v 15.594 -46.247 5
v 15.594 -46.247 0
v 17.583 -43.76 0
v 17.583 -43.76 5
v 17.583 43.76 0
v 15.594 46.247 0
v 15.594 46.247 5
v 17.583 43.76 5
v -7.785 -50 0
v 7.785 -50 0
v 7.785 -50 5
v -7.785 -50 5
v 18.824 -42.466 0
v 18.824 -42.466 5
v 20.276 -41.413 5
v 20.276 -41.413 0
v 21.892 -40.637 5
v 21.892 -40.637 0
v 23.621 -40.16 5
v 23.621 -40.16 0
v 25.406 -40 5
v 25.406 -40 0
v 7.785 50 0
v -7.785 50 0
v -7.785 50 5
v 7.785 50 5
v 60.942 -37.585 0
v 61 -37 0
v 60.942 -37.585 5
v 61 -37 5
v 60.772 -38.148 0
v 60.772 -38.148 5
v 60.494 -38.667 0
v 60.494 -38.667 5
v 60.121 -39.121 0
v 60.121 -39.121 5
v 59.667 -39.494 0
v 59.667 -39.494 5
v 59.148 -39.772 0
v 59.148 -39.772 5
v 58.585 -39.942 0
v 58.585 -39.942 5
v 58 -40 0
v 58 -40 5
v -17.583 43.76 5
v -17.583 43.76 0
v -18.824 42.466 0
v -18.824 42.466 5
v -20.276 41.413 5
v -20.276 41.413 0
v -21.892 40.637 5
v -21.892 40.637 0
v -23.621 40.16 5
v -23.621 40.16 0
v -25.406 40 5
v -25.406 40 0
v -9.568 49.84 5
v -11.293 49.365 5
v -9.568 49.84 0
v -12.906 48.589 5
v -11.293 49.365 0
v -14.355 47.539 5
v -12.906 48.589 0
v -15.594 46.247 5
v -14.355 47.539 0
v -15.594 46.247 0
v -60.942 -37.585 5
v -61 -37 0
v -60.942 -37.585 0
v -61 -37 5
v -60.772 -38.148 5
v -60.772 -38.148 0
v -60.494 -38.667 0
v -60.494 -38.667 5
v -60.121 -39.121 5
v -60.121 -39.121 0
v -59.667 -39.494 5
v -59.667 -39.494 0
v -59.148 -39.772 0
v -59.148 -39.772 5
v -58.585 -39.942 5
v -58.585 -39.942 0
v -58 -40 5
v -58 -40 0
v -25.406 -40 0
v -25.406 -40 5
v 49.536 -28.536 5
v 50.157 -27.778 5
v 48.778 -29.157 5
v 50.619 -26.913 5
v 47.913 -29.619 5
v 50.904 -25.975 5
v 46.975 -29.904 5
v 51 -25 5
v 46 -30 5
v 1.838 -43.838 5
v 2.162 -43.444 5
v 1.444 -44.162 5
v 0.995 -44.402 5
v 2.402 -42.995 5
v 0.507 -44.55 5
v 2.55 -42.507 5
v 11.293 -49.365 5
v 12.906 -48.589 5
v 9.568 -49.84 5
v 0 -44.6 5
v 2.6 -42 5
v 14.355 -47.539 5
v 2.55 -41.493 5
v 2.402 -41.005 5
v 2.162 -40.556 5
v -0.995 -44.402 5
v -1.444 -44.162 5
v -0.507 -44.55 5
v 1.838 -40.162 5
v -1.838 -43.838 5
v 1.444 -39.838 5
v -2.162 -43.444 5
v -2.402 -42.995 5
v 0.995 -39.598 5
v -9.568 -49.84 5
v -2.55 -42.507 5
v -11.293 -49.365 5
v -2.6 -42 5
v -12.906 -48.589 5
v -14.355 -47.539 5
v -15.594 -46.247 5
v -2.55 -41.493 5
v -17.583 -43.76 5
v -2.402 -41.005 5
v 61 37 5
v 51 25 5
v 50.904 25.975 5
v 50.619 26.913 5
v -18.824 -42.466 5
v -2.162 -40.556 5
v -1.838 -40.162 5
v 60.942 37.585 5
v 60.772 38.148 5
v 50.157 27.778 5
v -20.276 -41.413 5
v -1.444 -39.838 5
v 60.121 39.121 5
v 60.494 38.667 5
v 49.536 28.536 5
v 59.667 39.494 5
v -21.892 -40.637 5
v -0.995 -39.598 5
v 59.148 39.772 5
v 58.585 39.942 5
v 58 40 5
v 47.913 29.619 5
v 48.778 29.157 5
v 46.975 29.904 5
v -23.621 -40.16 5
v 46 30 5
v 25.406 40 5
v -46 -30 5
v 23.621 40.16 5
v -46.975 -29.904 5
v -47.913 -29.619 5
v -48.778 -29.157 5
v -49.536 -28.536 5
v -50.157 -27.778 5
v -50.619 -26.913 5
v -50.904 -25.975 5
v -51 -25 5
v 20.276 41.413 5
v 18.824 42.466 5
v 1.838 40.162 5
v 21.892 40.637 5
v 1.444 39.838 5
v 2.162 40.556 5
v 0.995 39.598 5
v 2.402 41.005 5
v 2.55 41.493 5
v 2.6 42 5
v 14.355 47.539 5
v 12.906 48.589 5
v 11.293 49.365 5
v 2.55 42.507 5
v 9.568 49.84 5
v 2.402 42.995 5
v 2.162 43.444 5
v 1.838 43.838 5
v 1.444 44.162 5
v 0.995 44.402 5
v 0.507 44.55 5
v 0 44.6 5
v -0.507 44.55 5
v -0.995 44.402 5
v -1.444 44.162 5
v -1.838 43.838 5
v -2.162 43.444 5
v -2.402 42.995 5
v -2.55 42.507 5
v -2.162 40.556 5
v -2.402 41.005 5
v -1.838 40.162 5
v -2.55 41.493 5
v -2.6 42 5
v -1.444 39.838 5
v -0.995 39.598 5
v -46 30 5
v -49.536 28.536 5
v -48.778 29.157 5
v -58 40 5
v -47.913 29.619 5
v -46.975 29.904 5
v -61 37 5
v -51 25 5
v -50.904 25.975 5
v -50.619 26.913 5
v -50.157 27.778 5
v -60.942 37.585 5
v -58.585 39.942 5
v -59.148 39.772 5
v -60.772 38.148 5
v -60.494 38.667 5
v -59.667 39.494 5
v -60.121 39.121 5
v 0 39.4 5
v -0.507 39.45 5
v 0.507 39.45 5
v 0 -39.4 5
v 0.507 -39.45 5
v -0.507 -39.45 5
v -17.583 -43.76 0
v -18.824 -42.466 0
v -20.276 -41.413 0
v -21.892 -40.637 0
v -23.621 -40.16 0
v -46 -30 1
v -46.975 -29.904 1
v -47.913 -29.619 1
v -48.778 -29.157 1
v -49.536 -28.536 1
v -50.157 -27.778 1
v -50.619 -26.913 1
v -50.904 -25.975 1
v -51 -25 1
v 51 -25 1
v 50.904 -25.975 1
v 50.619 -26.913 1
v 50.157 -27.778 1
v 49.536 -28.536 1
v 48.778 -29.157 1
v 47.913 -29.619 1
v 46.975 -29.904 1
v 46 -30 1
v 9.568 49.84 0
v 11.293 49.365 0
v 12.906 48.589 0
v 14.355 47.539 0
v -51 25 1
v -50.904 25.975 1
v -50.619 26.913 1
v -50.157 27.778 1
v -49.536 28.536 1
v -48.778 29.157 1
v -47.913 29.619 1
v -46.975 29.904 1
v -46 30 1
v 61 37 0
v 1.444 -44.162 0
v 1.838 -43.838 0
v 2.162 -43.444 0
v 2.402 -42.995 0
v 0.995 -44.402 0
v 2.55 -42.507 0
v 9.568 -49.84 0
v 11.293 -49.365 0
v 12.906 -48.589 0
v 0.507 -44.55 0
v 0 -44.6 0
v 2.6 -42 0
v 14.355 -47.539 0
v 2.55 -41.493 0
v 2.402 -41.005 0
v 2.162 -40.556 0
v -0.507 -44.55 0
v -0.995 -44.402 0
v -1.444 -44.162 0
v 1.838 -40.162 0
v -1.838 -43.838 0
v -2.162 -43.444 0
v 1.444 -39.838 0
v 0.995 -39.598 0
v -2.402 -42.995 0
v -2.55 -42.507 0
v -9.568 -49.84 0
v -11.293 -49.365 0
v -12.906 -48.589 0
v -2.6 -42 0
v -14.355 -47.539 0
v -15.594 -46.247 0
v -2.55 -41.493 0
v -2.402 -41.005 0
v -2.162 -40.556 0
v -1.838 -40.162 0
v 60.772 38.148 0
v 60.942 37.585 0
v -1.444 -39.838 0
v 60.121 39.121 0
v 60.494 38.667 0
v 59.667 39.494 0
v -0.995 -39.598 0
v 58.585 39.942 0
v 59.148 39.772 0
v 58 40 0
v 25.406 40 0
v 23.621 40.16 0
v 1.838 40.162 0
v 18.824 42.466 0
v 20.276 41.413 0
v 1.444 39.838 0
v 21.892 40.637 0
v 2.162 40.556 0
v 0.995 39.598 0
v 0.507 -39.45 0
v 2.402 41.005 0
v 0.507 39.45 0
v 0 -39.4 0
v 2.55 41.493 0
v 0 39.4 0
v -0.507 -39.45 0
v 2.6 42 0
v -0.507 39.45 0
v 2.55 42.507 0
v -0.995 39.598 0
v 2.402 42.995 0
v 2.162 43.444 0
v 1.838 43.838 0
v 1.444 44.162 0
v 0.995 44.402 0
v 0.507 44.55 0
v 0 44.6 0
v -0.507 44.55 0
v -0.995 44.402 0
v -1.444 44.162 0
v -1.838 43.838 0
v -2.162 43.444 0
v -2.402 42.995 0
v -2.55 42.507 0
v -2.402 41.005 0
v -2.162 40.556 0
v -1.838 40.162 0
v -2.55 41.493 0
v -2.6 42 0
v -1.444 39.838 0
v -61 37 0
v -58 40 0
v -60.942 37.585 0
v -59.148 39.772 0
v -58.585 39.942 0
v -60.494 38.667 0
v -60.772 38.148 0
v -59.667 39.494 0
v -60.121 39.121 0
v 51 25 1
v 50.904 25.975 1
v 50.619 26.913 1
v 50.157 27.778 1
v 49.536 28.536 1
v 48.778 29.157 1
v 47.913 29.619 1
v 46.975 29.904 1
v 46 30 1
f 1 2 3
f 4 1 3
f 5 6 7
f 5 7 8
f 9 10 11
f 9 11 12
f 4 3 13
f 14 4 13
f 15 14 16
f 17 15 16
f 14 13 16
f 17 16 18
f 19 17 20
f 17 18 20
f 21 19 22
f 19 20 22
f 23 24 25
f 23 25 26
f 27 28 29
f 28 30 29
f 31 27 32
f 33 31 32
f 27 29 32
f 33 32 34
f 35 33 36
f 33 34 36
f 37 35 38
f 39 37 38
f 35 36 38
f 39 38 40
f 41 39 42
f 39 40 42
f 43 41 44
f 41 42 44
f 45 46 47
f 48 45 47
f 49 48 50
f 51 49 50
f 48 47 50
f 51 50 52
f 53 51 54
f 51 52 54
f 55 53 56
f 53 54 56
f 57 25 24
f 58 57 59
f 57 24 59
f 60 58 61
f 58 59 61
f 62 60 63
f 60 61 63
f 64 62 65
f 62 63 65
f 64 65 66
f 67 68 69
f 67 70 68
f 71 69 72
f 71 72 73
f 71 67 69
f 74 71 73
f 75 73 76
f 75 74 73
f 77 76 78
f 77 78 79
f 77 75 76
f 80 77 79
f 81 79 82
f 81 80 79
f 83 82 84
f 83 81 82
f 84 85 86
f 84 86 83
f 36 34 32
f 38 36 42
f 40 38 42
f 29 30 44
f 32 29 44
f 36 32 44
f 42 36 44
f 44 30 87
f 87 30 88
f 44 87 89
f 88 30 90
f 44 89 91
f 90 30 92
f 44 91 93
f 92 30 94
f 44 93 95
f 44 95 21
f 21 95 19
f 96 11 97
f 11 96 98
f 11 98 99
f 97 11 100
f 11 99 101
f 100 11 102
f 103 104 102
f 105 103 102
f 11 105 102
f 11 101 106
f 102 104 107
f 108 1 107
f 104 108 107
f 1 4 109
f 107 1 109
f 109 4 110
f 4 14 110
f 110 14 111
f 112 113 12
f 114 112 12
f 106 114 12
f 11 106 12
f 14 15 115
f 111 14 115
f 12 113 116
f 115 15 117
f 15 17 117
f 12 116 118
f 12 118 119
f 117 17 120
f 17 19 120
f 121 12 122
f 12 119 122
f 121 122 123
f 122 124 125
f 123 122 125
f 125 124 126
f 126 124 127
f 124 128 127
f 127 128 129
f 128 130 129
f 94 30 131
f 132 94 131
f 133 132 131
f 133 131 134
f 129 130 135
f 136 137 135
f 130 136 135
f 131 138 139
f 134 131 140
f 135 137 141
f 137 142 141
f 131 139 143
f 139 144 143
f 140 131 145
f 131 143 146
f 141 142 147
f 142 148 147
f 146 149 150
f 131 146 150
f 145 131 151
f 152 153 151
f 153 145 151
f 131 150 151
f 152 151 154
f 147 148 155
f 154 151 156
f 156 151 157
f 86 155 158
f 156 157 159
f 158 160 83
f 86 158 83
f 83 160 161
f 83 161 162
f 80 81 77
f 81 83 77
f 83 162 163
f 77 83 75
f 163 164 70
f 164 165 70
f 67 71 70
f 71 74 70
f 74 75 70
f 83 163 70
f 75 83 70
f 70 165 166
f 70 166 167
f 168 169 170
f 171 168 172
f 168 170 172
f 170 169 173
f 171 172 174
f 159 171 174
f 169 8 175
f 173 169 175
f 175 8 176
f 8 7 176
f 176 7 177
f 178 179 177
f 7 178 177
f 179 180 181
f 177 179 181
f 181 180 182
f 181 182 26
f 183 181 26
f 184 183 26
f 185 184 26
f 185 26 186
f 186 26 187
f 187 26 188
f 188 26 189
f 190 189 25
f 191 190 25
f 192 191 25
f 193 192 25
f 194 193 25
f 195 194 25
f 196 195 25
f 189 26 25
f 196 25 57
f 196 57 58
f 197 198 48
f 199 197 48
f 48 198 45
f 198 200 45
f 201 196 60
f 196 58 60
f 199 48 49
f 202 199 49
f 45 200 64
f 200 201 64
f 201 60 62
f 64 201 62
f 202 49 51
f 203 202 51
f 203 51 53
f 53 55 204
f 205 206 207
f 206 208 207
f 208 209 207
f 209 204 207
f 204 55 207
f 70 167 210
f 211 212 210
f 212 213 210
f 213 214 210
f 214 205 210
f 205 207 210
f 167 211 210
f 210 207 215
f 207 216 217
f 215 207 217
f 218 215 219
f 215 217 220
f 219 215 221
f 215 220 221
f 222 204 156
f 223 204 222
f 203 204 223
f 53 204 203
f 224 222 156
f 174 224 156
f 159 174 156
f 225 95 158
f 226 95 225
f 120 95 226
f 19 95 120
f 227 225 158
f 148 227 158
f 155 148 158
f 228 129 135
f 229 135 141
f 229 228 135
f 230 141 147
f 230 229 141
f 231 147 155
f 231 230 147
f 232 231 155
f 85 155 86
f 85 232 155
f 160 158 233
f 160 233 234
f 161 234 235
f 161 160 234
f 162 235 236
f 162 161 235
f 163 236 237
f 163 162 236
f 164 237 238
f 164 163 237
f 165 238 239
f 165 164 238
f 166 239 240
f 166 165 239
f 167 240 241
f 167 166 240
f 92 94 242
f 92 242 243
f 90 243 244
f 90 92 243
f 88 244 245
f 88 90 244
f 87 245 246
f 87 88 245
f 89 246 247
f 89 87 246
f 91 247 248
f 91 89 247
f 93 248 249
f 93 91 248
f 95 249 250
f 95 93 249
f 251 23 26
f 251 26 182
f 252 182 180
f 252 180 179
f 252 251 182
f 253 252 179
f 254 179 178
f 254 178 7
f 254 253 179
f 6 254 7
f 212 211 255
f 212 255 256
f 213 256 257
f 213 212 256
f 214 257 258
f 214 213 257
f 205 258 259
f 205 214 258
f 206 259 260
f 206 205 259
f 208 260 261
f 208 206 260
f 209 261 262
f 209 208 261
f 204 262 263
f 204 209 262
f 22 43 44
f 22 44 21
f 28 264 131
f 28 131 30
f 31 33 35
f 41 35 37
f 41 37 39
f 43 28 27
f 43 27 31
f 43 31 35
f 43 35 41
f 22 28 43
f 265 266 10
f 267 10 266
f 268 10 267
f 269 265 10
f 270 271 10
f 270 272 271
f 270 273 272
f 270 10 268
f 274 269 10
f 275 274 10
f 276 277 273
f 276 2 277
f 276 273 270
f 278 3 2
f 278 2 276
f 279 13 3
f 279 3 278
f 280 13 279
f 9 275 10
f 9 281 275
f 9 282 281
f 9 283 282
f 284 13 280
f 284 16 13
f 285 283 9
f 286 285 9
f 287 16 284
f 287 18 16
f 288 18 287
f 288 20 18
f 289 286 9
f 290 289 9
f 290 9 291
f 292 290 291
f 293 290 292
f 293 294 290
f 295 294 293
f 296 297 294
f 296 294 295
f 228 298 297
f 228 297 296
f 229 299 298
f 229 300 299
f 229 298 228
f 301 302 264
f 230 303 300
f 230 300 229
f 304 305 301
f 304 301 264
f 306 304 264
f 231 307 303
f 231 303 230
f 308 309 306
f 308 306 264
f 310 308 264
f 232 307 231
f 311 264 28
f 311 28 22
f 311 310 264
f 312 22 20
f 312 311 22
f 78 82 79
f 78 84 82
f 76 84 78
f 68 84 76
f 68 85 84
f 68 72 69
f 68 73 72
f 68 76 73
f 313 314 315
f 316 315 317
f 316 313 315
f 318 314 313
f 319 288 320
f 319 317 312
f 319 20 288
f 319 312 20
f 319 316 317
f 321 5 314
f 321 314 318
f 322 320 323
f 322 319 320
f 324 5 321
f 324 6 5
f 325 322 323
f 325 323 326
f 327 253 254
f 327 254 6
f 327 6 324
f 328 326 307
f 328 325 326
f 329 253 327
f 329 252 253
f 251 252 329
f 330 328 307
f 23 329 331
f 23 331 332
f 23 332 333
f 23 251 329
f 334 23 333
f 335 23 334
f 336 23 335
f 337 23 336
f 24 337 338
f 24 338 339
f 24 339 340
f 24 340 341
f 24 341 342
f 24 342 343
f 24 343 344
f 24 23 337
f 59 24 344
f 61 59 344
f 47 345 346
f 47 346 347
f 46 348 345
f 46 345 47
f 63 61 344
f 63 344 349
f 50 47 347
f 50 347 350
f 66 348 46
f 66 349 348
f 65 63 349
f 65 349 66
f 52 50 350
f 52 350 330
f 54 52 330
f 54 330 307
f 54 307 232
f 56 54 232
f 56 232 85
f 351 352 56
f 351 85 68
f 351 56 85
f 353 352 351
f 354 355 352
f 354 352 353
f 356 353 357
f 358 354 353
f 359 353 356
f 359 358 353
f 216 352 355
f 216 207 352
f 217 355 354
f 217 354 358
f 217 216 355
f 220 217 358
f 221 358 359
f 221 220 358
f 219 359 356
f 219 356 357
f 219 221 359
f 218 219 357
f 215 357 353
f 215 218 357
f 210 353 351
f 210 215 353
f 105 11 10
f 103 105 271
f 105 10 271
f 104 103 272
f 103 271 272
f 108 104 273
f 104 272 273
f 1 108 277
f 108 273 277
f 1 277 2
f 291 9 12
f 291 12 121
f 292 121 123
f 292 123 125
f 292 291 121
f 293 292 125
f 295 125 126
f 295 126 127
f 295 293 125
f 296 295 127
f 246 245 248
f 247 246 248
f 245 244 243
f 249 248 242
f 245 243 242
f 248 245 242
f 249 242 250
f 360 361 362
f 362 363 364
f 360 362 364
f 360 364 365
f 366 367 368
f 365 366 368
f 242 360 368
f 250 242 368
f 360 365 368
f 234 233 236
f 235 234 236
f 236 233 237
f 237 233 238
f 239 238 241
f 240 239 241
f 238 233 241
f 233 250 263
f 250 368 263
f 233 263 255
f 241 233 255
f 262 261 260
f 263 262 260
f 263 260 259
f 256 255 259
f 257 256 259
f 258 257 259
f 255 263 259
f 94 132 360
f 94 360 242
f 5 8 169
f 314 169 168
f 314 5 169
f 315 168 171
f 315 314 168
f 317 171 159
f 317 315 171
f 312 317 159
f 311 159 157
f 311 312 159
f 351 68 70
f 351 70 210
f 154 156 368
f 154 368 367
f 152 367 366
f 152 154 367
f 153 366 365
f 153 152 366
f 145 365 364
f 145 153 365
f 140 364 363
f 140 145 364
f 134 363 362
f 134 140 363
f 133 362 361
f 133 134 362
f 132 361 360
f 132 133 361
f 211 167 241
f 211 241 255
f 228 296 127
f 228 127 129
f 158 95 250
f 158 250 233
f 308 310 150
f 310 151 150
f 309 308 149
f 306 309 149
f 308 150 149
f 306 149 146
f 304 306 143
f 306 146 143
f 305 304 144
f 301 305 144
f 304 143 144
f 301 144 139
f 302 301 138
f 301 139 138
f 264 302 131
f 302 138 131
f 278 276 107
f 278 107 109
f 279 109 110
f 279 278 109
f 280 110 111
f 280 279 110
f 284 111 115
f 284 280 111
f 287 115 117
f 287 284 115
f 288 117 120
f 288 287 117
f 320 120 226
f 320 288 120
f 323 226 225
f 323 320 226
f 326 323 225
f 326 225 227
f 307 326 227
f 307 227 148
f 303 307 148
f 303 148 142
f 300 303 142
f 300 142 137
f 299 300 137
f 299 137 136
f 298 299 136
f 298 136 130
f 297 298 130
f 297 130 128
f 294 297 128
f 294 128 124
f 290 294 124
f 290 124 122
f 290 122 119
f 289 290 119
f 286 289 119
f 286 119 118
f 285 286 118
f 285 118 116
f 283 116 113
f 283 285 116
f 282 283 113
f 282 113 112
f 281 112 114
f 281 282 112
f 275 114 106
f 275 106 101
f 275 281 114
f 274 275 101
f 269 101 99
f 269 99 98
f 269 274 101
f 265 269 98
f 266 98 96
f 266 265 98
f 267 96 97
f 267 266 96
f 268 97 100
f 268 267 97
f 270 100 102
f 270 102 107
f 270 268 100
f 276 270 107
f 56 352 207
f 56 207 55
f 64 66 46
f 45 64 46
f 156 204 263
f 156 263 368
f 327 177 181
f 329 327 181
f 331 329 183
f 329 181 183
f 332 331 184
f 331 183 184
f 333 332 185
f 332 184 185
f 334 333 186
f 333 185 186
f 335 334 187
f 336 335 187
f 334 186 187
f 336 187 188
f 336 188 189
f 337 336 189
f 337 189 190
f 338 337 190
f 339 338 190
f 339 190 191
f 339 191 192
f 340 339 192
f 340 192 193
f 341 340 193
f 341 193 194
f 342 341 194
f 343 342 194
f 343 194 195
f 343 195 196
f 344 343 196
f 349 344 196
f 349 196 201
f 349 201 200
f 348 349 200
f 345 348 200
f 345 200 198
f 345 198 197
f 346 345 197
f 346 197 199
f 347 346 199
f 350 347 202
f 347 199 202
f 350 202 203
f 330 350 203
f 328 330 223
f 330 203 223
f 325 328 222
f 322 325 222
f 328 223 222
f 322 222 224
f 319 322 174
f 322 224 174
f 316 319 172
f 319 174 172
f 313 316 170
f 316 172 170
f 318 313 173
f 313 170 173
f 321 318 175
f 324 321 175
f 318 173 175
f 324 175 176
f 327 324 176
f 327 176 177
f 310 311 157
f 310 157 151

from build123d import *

# Parameters (mm, degrees)
BOSS_EXTRUDE1_DEPTH  = 5
CUT_EXTRUDE1_START   = -10
SKETCH3_R            = 2.6
CUT_EXTRUDE1_DEPTH   = 10
FILLET1_R            = 10
FILLET2_R            = 3
SKETCH4_R            = 2.6
CUT_EXTRUDE2_DEPTH   = 10
CUT_EXTRUDE3_DEPTH   = 4
CUT_EXTRUDE4_DEPTH   = 83.286086309
MIRROR2_COPY_1_DEPTH = 83.286086309


with BuildPart() as part:
    # Sketch1 → Boss-Extrude1 (new body)
    with BuildSketch(Plane.XY):
        with BuildLine():
            Line((-58, 55), (58, 55))
            ThreePointArc((58, 55), (60.121320344, 54.121320344), (61, 52))
            Line((61, 52), (61, -52))
            ThreePointArc((61, -52), (60.121320344, -54.121320344), (58, -55))
            Line((58, -55), (-58, -55))
            ThreePointArc((-58, -55), (-60.121320344, -54.121320344), (-61, -52))
            Line((-61, -52), (-61, 52))
            ThreePointArc((-61, 52), (-60.121320344, 54.121320344), (-58, 55))
        make_face()
    extrude(amount=BOSS_EXTRUDE1_DEPTH)

    # Sketch3 → Cut-Extrude1 (cut)
    with BuildSketch(Plane.XY.offset(5).offset(CUT_EXTRUDE1_START)):
        with BuildLine():
            Line((-58, 55), (-8.6, 55))
            Line((-8.6, 55), (-8.6, 59.373865289))
            Line((-8.6, 59.373865289), (-61, 59.373865289))
            Line((-61, 59.373865289), (-61, 52))
            ThreePointArc((-61, 52), (-60.121320344, 54.121320344), (-58, 55))
        make_face()
        with BuildLine():
            Line((-17.597879381, 43.752948644), (-8.6, 55))
            Line((-8.6, 55), (-58, 55))
            ThreePointArc((-58, 55), (-60.121320344, 54.121320344), (-61, 52))
            Line((-61, 52), (-61, 40))
            Line((-61, 40), (-25.40648677, 40))
            ThreePointArc((-25.40648677, 40), (-21.074657685, 40.986939655), (-17.597879381, 43.752948644))
        make_face()
        with BuildLine():
            ThreePointArc((58, 55), (60.121320344, 54.121320344), (61, 52))
            Line((61, 52), (61, 59.373865289))
            Line((61, 59.373865289), (8.6, 59.373865289))
            Line((8.6, 59.373865289), (8.6, 55))
            Line((8.6, 55), (13.480832282, 55))
            Line((13.480832282, 55), (58, 55))
        make_face()
        with BuildLine():
            ThreePointArc((17.597879381, 43.752948644), (21.074657685, 40.986939655), (25.40648677, 40))
            Line((25.40648677, 40), (61, 40))
            Line((61, 40), (61, 52))
            ThreePointArc((61, 52), (60.121320344, 54.121320344), (58, 55))
            Line((58, 55), (13.480832282, 55))
            Line((13.480832282, 55), (8.6, 55))
            Line((8.6, 55), (17.597879381, 43.752948644))
        make_face()
        with BuildLine():
            Line((61, -52), (61, -40))
            Line((61, -40), (25.40648677, -40))
            ThreePointArc((25.40648677, -40), (21.074657685, -40.986939655), (17.597879381, -43.752948644))
            Line((17.597879381, -43.752948644), (8.6, -55))
            Line((8.6, -55), (58, -55))
            ThreePointArc((58, -55), (60.121320344, -54.121320344), (61, -52))
        make_face()
        with BuildLine():
            Line((61, -59.373865289), (61, -52))
            ThreePointArc((61, -52), (60.121320344, -54.121320344), (58, -55))
            Line((58, -55), (8.6, -55))
            Line((8.6, -55), (8.6, -59.373865289))
            Line((8.6, -59.373865289), (61, -59.373865289))
        make_face()
        with BuildLine():
            Line((-58, -55), (-8.6, -55))
            Line((-8.6, -55), (-17.597879381, -43.752948644))
            ThreePointArc((-17.597879381, -43.752948644), (-21.074657685, -40.986939655), (-25.40648677, -40))
            Line((-25.40648677, -40), (-61, -40))
            Line((-61, -40), (-61, -52))
            ThreePointArc((-61, -52), (-60.121320344, -54.121320344), (-58, -55))
        make_face()
        with BuildLine():
            Line((-8.6, -59.373865289), (-8.6, -55))
            Line((-8.6, -55), (-58, -55))
            ThreePointArc((-58, -55), (-60.121320344, -54.121320344), (-61, -52))
            Line((-61, -52), (-61, -59.373865289))
            Line((-61, -59.373865289), (-8.6, -59.373865289))
        make_face()
        with Locations((0, -42)):
            Circle(SKETCH3_R)
    extrude(amount=CUT_EXTRUDE1_DEPTH, mode=Mode.SUBTRACT)

    # Fillet1
    fillet1_edges = [part.edges().sort_by_distance(p)[0] for p in [
        (-8.6, 55, 2.5),
        (8.6, 55, 2.5),
        (8.6, -55, 2.5),
        (-8.6, -55, 2.5),
    ]]
    fillet(fillet1_edges, radius=FILLET1_R)

    # Fillet2
    fillet2_edges = [part.edges().sort_by_distance(p)[0] for p in [
        (-61, -40, 2.5),
        (-61, 40, 2.5),
        (61, 40, 2.5),
        (61, -40, 2.5),
    ]]
    fillet(fillet2_edges, radius=FILLET2_R)

    # Sketch4 → Cut-Extrude2 (cut)
    with BuildSketch(Plane.XY.offset(5)):
        with Locations((0, 42)):
            Circle(SKETCH4_R)
    extrude(amount=-CUT_EXTRUDE2_DEPTH, mode=Mode.SUBTRACT)

    # Sketch5 → Cut-Extrude3 (cut)
    with BuildSketch(Plane.XY.offset(5)):
        with BuildLine():
            Line((-46, 30), (46, 30))
            ThreePointArc((46, 30), (49.535533906, 28.535533906), (51, 25))
            Line((51, 25), (51, -25))
            ThreePointArc((51, -25), (49.535533906, -28.535533906), (46, -30))
            Line((46, -30), (-46, -30))
            ThreePointArc((-46, -30), (-49.535533906, -28.535533906), (-51, -25))
            Line((-51, -25), (-51, 25))
            ThreePointArc((-51, 25), (-49.535533906, 28.535533906), (-46, 30))
        make_face()
    extrude(amount=-CUT_EXTRUDE3_DEPTH, mode=Mode.SUBTRACT)

    # Sketch6 → Cut-Extrude4 (cut, through all)
    with BuildSketch(Plane(origin=(0, 0, 0), x_dir=(-1, 0, 0), z_dir=(0, 0, -1))):
        with BuildLine():
            Line((0, 50), (-7.785066229, 50))
            ThreePointArc((-7.785066229, 50), (-12.116895314, 49.013060345), (-15.593673618, 46.247051356))
            Line((-15.593673618, 46.247051356), (-17.583467028, 43.759875465))
            ThreePointArc((-17.583467028, 43.759875465), (-21.066662425, 40.988761251), (-25.40648677, 40))
            Line((-25.40648677, 40), (-25.40648677, 70))
            Line((-25.40648677, 70), (0, 70))
            Line((0, 70), (0, 50))
        make_face()
    cut_extrude4 = extrude(amount=-CUT_EXTRUDE4_DEPTH, mode=Mode.SUBTRACT)

    # Mirror1: Cut-Extrude4 across plane
    add(cut_extrude4.mirror(Plane(origin=(0, 0, 0), x_dir=(0, 0, 1), z_dir=(1, 0, 0))), mode=Mode.SUBTRACT)

    # Mirror2: Cut-Extrude4 across plane
    add(cut_extrude4.mirror(Plane.ZX), mode=Mode.SUBTRACT)

    # Mirror2 copy 1 sketch → Mirror2 copy 1 (cut, through all)
    with BuildSketch(Plane(origin=(0, 0, 0), x_dir=(1, 0, 0), z_dir=(0, 0, -1))):
        with BuildLine():
            Line((0, 50), (-7.785066229, 50))
            ThreePointArc((-7.785066229, 50), (-12.116895314, 49.013060345), (-15.593673618, 46.247051356))
            Line((-15.593673618, 46.247051356), (-17.583467028, 43.759875465))
            ThreePointArc((-17.583467028, 43.759875465), (-21.066662425, 40.988761251), (-25.40648677, 40))
            Line((-25.40648677, 40), (-25.40648677, 70))
            Line((-25.40648677, 70), (0, 70))
            Line((0, 70), (0, 50))
        make_face()
    extrude(amount=-MIRROR2_COPY_1_DEPTH, mode=Mode.SUBTRACT)


solid = part.part
